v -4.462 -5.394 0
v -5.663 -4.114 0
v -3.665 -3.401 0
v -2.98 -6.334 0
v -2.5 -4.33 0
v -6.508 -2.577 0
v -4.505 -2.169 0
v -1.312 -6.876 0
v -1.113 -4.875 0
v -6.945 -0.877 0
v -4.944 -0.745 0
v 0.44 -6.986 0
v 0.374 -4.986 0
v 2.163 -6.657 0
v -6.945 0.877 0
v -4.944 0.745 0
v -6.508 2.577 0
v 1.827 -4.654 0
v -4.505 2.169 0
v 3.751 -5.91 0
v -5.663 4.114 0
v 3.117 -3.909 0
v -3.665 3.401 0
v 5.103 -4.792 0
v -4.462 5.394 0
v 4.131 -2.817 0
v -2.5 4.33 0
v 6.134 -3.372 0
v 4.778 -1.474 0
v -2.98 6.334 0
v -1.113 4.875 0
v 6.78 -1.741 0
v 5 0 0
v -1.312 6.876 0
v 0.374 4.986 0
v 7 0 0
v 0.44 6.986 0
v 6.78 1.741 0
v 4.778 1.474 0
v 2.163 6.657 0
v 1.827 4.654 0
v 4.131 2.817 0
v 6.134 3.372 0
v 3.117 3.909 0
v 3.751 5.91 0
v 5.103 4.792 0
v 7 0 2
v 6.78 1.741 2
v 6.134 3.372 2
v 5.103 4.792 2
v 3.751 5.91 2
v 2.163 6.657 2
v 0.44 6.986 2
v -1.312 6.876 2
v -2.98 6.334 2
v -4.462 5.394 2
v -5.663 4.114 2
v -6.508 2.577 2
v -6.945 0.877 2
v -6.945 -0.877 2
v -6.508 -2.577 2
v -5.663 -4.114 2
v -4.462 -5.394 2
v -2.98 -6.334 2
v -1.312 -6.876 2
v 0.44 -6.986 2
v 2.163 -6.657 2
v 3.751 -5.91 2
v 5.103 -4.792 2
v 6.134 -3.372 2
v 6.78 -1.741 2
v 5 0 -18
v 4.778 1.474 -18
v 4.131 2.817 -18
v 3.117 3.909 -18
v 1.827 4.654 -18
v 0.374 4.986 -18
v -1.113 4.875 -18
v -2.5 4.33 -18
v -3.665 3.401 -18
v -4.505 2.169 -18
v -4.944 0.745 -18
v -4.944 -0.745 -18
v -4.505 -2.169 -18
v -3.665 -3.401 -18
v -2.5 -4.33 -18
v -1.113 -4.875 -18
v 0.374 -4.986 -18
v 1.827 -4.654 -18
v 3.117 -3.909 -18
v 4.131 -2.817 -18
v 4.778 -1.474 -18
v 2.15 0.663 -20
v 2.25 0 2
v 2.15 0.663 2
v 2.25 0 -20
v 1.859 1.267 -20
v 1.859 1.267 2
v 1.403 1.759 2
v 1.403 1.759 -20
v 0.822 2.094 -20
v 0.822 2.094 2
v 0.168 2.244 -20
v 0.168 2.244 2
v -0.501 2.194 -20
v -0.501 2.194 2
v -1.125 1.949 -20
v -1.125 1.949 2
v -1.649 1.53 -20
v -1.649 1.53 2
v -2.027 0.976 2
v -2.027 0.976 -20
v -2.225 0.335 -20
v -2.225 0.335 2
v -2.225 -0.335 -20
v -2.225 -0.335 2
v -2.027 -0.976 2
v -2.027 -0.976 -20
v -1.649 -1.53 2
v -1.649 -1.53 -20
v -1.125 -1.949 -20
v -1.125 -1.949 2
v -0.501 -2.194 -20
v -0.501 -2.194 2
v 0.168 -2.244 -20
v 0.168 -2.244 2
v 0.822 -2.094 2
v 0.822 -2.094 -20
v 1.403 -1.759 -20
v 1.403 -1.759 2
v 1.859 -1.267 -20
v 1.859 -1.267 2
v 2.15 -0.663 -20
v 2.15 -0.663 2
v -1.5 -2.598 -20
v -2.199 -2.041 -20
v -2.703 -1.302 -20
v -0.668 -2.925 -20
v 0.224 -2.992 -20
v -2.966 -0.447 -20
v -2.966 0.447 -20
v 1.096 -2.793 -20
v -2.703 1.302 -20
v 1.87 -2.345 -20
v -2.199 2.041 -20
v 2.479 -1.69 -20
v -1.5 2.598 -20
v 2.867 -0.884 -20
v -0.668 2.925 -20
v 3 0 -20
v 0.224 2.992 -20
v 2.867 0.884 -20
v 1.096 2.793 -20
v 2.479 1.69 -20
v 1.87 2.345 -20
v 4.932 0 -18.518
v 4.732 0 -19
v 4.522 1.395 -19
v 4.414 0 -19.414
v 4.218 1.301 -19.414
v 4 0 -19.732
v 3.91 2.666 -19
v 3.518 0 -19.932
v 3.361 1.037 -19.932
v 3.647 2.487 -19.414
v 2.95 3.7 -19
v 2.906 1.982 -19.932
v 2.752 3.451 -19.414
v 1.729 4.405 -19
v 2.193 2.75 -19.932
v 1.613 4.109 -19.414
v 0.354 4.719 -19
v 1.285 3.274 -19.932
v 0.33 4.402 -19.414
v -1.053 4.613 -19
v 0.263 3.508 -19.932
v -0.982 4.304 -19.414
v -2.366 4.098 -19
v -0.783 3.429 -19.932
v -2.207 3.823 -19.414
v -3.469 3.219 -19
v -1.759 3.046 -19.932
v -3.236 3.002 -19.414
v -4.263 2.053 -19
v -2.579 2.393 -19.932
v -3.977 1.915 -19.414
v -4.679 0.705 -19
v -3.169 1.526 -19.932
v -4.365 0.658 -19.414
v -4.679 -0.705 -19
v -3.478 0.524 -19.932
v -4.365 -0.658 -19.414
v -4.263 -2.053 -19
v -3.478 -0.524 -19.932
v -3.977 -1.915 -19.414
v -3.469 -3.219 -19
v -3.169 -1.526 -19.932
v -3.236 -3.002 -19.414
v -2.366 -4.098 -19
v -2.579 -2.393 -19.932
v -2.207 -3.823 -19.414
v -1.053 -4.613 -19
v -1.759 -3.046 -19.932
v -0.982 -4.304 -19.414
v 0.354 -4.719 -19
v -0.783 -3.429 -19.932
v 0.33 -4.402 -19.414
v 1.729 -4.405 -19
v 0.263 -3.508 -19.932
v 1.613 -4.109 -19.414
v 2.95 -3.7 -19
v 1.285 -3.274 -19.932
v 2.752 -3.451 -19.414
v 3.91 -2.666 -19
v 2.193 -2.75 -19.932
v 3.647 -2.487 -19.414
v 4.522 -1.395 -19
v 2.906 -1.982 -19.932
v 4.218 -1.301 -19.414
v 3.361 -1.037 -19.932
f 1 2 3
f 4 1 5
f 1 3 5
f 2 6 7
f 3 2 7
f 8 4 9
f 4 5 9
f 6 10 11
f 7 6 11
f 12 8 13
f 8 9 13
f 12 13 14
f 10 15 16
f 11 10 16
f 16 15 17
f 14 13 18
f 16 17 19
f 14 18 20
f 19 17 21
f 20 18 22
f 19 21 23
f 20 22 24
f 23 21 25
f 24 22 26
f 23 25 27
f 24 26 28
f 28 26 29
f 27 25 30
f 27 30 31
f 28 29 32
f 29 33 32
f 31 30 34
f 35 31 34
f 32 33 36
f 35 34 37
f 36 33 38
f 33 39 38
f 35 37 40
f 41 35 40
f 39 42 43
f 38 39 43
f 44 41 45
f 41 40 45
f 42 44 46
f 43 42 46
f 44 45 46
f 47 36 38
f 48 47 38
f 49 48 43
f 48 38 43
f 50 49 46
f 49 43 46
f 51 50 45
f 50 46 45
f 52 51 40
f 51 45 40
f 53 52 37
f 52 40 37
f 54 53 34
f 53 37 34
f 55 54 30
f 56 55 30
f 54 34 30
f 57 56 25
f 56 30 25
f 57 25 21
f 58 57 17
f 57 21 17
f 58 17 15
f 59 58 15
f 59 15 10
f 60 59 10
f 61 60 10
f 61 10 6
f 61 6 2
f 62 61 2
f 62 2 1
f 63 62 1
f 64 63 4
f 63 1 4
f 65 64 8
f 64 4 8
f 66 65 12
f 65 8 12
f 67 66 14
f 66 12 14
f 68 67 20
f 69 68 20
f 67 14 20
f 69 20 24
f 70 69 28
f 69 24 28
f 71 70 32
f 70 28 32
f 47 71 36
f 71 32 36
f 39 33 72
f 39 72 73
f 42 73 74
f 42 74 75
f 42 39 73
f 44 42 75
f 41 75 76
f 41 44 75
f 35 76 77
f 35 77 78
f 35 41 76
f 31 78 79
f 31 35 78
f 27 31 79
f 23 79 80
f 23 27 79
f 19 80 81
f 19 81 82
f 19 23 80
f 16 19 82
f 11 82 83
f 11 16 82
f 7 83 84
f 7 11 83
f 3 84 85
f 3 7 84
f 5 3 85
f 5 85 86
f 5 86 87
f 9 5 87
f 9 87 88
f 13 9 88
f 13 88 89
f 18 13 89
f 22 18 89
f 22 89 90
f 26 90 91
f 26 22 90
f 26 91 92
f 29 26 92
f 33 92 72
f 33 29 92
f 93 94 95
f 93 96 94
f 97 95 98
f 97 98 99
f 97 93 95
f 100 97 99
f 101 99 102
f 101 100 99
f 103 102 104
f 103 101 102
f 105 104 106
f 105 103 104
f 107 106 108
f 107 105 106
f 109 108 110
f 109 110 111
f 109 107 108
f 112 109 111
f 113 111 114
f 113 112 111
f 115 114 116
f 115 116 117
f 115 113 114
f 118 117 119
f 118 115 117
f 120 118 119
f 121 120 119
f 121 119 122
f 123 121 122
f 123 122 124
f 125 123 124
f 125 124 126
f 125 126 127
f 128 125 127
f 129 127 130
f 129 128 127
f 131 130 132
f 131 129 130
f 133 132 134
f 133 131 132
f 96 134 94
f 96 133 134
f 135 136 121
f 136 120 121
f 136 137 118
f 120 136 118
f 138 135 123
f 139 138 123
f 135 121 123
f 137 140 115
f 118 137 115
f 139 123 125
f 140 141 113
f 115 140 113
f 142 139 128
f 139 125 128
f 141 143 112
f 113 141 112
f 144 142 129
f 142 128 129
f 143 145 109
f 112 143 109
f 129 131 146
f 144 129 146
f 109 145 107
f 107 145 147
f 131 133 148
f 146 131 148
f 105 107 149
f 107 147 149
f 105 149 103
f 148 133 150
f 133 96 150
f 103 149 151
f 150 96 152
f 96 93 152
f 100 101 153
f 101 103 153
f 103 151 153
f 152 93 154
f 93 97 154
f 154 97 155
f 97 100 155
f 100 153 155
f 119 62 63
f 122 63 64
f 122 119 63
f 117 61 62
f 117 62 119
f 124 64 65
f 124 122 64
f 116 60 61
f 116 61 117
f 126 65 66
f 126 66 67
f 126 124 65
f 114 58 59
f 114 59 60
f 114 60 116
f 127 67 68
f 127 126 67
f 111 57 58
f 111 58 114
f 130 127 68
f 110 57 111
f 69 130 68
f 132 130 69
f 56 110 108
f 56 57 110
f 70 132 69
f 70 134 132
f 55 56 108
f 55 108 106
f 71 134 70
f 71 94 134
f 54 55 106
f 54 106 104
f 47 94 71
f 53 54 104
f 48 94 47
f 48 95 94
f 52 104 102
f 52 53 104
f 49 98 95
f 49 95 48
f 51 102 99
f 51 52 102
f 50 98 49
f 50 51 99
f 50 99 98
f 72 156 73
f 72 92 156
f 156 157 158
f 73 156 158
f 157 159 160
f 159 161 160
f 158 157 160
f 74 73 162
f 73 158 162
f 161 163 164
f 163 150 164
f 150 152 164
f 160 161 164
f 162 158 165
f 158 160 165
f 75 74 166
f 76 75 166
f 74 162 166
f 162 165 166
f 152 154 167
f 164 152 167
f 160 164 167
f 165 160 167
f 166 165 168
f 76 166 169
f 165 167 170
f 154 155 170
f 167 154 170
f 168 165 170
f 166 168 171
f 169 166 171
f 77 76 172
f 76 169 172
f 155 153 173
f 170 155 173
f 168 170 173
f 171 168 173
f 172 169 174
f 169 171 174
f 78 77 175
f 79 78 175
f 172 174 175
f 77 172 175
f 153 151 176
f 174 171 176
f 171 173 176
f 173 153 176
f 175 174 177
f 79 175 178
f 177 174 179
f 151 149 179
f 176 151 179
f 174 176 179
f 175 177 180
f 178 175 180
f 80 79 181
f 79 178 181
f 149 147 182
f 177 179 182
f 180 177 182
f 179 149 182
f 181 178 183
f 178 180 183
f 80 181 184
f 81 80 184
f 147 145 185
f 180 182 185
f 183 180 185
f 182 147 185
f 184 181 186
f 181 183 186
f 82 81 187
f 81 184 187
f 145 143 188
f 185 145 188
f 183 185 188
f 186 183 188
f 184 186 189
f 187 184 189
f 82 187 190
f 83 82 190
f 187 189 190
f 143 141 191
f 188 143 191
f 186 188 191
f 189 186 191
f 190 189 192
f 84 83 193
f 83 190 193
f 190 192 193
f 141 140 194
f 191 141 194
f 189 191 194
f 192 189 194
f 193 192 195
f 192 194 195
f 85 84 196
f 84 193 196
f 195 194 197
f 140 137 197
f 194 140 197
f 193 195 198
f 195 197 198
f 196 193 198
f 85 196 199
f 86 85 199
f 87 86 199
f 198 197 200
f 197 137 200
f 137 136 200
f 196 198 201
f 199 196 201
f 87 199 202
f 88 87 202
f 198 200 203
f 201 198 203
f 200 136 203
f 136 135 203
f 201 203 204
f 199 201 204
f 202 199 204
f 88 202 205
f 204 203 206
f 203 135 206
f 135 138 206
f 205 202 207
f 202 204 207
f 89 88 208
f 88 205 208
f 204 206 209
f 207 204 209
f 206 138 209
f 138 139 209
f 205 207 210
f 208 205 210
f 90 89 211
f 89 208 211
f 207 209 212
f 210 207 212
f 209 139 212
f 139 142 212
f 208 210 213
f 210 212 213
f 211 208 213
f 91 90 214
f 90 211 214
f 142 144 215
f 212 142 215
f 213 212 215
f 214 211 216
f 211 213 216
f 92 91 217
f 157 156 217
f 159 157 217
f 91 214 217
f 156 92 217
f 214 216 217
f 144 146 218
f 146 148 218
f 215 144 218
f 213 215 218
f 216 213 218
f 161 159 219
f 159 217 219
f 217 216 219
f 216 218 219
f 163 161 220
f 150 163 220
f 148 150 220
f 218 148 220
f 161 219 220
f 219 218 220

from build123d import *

# Parameters (mm, degrees)
F0_R     = 5
F0_R_2   = 2.25
F1_DEPTH = 20
F2_R     = 2
F3_R     = 7
F3_R_2   = 2.25
F4_DEPTH = 2


with BuildPart() as f1:
    # F0 (on Top) → F1 (new body)
    with BuildSketch(Plane.XY):
        Circle(F0_R)
        Circle(F0_R_2, mode=Mode.SUBTRACT)
    extrude(amount=-F1_DEPTH)

    # F2
    f2_edges = [f1.edges().sort_by_distance(p)[0] for p in [
        (-5, 0, -20),
    ]]
    fillet(f2_edges, radius=F2_R)

    # F3 (on face) → F4 (join)
    with BuildSketch(Plane.XY):
        Circle(F3_R)
        Circle(F3_R_2, mode=Mode.SUBTRACT)
    extrude(amount=F4_DEPTH)


solid = f1.part
